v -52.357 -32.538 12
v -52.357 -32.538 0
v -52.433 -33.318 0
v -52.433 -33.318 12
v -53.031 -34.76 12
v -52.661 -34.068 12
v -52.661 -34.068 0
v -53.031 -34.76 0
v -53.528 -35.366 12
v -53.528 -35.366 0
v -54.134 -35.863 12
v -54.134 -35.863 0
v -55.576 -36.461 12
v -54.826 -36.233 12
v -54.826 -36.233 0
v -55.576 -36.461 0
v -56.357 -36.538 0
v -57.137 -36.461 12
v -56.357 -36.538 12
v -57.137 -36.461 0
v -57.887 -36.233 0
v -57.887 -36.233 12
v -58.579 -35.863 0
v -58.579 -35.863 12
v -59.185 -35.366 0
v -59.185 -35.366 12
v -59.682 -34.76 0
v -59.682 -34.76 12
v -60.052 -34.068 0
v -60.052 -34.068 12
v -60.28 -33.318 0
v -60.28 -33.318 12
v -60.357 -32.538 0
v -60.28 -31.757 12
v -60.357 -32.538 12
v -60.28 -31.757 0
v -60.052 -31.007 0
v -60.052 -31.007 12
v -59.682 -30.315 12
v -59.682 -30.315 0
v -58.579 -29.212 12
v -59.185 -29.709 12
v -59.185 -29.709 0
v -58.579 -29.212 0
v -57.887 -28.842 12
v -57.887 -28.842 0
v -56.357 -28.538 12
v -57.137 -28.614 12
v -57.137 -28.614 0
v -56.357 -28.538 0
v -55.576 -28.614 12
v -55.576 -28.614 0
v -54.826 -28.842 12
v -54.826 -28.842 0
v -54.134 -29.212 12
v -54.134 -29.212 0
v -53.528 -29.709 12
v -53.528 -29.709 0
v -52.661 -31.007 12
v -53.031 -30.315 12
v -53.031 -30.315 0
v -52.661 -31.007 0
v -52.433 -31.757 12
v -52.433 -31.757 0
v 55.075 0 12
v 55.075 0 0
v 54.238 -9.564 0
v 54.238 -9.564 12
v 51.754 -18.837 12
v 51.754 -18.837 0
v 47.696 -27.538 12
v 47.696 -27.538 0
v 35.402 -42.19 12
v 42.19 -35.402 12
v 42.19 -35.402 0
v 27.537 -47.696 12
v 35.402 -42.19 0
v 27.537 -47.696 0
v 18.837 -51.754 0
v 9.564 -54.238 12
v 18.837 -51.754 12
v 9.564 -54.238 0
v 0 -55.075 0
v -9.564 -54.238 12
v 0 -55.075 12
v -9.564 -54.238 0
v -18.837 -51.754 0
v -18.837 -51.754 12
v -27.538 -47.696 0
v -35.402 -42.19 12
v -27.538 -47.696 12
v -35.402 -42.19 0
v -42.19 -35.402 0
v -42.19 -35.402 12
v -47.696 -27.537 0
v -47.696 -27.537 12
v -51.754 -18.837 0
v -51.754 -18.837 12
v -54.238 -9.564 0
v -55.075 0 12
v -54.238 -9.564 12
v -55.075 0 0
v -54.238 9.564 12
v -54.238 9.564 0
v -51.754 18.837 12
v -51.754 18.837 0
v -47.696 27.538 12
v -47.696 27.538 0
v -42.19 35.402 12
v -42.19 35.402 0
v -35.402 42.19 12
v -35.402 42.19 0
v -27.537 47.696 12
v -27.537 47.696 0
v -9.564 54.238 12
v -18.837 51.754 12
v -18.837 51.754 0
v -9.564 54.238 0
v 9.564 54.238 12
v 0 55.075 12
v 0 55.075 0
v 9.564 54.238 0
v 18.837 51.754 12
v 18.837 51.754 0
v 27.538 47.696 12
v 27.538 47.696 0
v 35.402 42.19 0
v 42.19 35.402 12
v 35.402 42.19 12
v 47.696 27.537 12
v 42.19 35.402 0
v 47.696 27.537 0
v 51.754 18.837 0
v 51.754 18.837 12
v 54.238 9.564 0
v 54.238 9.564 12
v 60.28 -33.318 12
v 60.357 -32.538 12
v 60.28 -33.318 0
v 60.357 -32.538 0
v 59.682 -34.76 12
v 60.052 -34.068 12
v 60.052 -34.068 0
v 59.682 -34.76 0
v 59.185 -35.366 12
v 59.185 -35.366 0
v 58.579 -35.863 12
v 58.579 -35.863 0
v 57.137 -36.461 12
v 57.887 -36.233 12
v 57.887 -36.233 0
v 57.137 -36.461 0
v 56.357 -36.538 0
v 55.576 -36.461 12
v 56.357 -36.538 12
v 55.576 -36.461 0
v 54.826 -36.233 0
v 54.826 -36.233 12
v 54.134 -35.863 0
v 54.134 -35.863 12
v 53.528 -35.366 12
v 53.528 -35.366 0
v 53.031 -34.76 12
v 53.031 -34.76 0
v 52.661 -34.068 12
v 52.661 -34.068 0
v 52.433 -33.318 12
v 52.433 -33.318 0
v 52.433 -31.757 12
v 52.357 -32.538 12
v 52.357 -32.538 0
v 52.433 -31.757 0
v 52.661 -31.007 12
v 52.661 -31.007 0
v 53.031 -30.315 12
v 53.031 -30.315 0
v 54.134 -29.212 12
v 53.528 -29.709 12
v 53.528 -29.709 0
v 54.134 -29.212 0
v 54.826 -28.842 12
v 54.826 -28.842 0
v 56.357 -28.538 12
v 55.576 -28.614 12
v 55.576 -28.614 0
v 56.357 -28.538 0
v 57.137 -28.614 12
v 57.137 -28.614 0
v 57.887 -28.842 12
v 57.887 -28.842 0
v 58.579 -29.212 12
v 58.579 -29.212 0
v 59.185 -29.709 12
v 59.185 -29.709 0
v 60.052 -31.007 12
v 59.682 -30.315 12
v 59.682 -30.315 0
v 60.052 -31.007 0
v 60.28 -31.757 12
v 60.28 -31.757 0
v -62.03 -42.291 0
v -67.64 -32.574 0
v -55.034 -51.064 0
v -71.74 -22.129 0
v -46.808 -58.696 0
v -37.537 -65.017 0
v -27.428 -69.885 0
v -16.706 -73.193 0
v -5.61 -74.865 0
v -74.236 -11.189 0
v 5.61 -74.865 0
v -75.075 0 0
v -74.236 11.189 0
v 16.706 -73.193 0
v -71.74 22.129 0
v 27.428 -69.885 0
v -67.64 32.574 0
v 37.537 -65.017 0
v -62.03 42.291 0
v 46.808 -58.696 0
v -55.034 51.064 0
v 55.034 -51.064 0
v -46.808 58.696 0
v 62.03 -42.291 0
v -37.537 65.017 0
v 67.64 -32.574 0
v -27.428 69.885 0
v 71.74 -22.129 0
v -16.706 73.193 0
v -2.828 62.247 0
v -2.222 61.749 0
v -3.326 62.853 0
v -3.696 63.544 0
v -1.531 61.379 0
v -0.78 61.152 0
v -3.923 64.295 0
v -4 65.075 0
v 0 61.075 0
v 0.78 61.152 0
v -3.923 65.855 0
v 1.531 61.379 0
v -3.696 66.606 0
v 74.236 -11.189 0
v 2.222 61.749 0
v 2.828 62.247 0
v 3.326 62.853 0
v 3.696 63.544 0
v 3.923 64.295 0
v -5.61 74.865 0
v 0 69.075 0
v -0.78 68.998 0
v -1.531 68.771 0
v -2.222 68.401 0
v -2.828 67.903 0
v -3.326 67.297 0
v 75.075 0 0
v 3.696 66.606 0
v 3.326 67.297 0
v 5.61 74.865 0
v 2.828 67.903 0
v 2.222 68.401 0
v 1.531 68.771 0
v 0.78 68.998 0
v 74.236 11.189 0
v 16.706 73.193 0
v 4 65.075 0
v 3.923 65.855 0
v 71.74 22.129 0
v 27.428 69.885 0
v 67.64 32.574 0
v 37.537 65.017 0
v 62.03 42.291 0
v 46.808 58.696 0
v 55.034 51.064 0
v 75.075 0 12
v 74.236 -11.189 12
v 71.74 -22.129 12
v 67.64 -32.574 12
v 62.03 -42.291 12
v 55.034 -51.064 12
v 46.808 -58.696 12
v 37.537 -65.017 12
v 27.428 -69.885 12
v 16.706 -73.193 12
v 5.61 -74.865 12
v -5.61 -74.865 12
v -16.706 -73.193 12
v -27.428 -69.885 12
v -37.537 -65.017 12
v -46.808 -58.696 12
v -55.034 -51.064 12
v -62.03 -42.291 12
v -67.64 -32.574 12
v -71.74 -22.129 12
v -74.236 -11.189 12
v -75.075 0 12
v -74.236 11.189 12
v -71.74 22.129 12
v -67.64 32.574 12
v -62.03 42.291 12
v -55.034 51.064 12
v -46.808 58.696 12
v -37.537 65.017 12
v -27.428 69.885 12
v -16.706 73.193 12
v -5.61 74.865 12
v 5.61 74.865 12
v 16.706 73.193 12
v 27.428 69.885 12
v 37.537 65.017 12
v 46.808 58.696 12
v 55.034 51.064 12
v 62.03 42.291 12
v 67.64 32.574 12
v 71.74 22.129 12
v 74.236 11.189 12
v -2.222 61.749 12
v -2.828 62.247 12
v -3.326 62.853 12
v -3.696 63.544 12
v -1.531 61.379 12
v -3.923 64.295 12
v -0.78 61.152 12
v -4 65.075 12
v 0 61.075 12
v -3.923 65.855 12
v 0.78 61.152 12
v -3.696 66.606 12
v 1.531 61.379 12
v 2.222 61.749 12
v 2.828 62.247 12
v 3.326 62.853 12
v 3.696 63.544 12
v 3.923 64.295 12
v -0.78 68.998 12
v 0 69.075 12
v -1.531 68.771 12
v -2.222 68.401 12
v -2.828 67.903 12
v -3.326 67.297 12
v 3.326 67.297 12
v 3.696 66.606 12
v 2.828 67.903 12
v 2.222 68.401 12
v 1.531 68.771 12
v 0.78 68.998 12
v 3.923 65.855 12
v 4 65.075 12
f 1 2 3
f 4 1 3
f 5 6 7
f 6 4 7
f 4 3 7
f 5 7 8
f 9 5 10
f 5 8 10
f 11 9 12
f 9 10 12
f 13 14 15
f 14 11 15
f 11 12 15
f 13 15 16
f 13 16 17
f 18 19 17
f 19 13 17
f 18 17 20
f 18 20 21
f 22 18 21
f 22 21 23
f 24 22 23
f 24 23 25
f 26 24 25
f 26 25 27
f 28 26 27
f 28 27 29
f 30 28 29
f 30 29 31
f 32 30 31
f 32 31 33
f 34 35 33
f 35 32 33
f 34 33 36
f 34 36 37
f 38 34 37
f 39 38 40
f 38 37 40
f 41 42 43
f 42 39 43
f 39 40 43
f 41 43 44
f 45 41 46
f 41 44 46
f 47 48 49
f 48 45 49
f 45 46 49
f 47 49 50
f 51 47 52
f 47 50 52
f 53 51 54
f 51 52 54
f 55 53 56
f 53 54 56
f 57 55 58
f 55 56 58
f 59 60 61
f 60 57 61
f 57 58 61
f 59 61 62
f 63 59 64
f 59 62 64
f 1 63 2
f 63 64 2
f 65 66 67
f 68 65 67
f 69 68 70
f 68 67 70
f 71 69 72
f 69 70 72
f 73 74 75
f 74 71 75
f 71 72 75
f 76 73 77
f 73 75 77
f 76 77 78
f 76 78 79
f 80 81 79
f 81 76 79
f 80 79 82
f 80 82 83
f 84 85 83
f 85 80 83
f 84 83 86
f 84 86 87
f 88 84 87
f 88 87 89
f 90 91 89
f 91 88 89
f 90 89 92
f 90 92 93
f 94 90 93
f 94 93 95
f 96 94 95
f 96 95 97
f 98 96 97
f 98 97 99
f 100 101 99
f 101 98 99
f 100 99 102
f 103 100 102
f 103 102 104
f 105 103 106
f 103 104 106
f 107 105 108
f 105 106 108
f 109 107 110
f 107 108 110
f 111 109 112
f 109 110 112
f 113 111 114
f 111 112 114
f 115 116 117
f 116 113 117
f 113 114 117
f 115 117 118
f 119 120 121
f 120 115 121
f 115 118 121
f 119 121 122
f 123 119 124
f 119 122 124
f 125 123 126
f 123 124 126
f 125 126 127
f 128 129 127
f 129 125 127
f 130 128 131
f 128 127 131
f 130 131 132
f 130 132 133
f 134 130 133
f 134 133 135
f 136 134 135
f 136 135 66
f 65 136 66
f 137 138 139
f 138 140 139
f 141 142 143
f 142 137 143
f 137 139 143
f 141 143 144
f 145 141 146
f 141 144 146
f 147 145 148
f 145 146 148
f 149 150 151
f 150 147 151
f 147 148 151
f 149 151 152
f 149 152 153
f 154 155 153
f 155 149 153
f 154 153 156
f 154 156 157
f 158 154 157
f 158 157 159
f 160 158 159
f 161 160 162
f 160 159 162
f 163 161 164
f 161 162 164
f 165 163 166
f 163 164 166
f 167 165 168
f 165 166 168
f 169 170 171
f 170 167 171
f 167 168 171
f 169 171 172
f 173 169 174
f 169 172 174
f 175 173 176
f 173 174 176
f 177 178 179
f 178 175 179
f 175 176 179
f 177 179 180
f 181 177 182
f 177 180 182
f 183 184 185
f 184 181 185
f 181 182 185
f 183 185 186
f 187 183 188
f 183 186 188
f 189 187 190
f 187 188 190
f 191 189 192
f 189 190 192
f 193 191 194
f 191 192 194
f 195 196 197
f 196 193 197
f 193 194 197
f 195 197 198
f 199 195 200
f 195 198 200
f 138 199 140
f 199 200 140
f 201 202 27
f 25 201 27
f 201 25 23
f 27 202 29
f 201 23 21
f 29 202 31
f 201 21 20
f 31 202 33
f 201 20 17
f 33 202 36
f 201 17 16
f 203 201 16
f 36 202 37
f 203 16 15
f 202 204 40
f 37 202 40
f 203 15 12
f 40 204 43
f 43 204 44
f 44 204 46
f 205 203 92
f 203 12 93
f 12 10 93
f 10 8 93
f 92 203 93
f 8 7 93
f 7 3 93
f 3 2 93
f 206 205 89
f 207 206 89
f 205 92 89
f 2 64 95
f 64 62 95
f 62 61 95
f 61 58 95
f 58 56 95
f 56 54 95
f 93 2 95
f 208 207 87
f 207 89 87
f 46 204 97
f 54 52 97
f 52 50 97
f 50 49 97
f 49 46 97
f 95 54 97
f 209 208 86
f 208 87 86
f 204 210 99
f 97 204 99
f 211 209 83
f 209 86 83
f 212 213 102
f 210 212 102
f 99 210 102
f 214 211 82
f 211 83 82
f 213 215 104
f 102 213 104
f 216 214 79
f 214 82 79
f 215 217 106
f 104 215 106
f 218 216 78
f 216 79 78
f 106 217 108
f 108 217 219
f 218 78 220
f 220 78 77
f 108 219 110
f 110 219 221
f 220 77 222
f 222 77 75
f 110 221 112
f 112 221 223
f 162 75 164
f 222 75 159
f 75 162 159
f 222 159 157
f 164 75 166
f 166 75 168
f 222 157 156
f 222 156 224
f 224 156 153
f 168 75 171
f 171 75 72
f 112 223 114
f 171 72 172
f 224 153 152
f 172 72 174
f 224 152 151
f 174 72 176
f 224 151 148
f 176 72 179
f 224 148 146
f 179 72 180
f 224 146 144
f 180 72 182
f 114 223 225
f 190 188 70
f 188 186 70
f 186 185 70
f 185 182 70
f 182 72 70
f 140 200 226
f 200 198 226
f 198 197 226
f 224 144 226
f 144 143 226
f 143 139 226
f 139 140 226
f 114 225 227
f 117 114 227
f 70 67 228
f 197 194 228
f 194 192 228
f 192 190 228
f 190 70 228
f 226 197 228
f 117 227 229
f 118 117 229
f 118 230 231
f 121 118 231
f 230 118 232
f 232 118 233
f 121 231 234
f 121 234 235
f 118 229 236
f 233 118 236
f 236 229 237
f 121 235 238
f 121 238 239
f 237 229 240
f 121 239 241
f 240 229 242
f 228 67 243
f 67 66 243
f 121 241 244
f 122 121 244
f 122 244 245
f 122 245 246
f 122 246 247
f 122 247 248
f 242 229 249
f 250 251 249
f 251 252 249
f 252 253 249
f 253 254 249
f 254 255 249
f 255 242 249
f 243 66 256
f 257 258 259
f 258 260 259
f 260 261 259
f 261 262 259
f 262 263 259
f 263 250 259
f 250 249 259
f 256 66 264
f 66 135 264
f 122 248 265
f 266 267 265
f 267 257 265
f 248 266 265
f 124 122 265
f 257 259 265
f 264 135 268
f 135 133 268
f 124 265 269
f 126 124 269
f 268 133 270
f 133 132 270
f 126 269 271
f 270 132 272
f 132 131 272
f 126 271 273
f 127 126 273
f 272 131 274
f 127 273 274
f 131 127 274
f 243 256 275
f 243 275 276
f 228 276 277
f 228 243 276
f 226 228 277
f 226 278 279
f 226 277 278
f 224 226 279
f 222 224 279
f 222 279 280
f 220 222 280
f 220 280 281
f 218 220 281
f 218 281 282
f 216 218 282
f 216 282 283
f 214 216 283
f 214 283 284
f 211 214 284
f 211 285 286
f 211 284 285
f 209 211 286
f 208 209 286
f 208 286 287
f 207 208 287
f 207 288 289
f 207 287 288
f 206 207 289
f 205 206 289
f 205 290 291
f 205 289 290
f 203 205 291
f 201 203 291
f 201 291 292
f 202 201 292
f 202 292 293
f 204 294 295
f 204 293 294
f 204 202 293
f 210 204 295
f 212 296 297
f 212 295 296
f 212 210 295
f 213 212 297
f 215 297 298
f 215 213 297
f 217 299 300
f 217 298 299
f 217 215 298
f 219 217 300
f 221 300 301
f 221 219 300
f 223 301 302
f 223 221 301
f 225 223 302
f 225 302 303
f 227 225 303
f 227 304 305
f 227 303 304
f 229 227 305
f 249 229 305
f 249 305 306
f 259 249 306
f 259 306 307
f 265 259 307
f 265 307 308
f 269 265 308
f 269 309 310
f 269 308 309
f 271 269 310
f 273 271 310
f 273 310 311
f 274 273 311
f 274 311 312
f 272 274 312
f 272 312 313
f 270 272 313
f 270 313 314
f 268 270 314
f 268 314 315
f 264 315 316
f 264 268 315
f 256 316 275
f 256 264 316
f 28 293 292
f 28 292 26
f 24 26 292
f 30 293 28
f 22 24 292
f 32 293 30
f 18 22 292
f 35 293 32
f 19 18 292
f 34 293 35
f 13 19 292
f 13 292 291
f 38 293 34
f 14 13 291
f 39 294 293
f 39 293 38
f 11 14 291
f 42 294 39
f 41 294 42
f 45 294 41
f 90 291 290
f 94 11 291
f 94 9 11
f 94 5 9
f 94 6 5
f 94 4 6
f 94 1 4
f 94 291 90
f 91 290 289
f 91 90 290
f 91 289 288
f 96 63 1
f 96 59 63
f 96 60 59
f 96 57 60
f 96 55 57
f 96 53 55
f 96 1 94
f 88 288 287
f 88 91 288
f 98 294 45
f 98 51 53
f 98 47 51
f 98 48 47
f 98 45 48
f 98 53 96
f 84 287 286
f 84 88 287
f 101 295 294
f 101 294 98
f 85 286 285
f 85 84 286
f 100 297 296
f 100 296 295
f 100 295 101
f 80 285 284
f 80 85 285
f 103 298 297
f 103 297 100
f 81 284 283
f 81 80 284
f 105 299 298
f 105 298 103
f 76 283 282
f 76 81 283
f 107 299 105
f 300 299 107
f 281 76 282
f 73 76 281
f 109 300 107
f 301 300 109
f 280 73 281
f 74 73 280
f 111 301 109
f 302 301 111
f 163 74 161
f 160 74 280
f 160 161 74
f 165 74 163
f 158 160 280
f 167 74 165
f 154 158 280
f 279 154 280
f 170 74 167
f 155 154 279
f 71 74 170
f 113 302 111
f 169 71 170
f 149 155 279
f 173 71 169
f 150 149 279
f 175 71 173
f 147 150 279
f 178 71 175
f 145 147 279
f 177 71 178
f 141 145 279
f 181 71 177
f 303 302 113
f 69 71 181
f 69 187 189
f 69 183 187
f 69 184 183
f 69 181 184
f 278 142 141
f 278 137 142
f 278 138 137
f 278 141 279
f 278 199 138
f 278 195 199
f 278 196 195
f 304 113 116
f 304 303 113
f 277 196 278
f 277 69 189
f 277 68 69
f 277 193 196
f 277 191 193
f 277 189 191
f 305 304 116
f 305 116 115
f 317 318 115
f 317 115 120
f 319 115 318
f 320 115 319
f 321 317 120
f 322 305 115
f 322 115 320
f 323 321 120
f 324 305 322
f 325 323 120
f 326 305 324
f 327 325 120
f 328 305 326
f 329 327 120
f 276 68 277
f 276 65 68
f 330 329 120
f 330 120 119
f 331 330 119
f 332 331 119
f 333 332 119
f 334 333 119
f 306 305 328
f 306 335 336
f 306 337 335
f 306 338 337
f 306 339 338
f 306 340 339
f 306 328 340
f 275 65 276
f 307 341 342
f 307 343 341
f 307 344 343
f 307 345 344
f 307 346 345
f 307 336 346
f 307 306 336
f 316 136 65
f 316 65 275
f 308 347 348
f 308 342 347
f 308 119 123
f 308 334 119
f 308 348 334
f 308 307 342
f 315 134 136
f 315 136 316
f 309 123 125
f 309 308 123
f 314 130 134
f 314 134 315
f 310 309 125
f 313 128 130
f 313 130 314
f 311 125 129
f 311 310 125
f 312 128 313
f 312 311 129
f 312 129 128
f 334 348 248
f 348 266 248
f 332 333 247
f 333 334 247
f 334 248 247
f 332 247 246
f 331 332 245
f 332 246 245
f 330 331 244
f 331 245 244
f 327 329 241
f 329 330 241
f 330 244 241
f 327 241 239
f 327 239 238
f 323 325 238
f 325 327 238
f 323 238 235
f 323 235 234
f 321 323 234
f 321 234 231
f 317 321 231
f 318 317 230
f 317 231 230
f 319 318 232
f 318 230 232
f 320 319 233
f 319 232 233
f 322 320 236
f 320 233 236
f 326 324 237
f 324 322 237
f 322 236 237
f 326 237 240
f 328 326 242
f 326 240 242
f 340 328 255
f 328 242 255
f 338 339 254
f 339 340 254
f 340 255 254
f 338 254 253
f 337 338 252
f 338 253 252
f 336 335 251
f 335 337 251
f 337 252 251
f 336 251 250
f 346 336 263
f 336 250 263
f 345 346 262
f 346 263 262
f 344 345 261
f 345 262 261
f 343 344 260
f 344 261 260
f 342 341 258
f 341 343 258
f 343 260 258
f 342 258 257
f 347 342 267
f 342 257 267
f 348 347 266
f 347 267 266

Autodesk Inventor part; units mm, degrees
ref_plane "YZ Plane" through (0, 0, 0) normal (1, 0, 0) x (0, 1, 0)
ref_plane "XZ Plane" through (0, 0, 0) normal (0, 1, 0) x (-1, 0, 0)
ref_plane "XY Plane" through (0, 0, 0) normal (0, 0, 1) x (1, 0, 0)
sketch "Sketch1" plane through (0, 0, 0) normal (0, 0, 1) x (1, 0, 0)
  circle A0 centre (0, 0) radius 55.075
  circle A1 centre (0, 0) radius 75.075
  circle A2 centre (0, 65.075) radius 4
  circle A3 centre (-56.3566, -32.5375) radius 4
  circle A4 centre (56.3566, -32.5375) radius 4
  line L0 (0, 65.075) -> (-56.3566, -32.5375) construction
  line L1 (-56.3566, -32.5375) -> (56.3566, -32.5375) construction
  line L2 (56.3566, -32.5375) -> (0, 65.075) construction
  line L3 (0, 65.075) -> (0, 55.075) construction
  line L4 (-56.3566, -32.5375) -> (-47.6963, -27.5375) construction
  line L5 (56.3566, -32.5375) -> (47.6963, -27.5375) construction
  dimension "d0" = 20
  dimension "d1" = 110.15
  dimension "d7" = 8
  dimension "d8" = 10
extrude "Extrusion1" add sketch "Sketch1" along normal blind 12
properties part number "Tractor_Mobile_2"
